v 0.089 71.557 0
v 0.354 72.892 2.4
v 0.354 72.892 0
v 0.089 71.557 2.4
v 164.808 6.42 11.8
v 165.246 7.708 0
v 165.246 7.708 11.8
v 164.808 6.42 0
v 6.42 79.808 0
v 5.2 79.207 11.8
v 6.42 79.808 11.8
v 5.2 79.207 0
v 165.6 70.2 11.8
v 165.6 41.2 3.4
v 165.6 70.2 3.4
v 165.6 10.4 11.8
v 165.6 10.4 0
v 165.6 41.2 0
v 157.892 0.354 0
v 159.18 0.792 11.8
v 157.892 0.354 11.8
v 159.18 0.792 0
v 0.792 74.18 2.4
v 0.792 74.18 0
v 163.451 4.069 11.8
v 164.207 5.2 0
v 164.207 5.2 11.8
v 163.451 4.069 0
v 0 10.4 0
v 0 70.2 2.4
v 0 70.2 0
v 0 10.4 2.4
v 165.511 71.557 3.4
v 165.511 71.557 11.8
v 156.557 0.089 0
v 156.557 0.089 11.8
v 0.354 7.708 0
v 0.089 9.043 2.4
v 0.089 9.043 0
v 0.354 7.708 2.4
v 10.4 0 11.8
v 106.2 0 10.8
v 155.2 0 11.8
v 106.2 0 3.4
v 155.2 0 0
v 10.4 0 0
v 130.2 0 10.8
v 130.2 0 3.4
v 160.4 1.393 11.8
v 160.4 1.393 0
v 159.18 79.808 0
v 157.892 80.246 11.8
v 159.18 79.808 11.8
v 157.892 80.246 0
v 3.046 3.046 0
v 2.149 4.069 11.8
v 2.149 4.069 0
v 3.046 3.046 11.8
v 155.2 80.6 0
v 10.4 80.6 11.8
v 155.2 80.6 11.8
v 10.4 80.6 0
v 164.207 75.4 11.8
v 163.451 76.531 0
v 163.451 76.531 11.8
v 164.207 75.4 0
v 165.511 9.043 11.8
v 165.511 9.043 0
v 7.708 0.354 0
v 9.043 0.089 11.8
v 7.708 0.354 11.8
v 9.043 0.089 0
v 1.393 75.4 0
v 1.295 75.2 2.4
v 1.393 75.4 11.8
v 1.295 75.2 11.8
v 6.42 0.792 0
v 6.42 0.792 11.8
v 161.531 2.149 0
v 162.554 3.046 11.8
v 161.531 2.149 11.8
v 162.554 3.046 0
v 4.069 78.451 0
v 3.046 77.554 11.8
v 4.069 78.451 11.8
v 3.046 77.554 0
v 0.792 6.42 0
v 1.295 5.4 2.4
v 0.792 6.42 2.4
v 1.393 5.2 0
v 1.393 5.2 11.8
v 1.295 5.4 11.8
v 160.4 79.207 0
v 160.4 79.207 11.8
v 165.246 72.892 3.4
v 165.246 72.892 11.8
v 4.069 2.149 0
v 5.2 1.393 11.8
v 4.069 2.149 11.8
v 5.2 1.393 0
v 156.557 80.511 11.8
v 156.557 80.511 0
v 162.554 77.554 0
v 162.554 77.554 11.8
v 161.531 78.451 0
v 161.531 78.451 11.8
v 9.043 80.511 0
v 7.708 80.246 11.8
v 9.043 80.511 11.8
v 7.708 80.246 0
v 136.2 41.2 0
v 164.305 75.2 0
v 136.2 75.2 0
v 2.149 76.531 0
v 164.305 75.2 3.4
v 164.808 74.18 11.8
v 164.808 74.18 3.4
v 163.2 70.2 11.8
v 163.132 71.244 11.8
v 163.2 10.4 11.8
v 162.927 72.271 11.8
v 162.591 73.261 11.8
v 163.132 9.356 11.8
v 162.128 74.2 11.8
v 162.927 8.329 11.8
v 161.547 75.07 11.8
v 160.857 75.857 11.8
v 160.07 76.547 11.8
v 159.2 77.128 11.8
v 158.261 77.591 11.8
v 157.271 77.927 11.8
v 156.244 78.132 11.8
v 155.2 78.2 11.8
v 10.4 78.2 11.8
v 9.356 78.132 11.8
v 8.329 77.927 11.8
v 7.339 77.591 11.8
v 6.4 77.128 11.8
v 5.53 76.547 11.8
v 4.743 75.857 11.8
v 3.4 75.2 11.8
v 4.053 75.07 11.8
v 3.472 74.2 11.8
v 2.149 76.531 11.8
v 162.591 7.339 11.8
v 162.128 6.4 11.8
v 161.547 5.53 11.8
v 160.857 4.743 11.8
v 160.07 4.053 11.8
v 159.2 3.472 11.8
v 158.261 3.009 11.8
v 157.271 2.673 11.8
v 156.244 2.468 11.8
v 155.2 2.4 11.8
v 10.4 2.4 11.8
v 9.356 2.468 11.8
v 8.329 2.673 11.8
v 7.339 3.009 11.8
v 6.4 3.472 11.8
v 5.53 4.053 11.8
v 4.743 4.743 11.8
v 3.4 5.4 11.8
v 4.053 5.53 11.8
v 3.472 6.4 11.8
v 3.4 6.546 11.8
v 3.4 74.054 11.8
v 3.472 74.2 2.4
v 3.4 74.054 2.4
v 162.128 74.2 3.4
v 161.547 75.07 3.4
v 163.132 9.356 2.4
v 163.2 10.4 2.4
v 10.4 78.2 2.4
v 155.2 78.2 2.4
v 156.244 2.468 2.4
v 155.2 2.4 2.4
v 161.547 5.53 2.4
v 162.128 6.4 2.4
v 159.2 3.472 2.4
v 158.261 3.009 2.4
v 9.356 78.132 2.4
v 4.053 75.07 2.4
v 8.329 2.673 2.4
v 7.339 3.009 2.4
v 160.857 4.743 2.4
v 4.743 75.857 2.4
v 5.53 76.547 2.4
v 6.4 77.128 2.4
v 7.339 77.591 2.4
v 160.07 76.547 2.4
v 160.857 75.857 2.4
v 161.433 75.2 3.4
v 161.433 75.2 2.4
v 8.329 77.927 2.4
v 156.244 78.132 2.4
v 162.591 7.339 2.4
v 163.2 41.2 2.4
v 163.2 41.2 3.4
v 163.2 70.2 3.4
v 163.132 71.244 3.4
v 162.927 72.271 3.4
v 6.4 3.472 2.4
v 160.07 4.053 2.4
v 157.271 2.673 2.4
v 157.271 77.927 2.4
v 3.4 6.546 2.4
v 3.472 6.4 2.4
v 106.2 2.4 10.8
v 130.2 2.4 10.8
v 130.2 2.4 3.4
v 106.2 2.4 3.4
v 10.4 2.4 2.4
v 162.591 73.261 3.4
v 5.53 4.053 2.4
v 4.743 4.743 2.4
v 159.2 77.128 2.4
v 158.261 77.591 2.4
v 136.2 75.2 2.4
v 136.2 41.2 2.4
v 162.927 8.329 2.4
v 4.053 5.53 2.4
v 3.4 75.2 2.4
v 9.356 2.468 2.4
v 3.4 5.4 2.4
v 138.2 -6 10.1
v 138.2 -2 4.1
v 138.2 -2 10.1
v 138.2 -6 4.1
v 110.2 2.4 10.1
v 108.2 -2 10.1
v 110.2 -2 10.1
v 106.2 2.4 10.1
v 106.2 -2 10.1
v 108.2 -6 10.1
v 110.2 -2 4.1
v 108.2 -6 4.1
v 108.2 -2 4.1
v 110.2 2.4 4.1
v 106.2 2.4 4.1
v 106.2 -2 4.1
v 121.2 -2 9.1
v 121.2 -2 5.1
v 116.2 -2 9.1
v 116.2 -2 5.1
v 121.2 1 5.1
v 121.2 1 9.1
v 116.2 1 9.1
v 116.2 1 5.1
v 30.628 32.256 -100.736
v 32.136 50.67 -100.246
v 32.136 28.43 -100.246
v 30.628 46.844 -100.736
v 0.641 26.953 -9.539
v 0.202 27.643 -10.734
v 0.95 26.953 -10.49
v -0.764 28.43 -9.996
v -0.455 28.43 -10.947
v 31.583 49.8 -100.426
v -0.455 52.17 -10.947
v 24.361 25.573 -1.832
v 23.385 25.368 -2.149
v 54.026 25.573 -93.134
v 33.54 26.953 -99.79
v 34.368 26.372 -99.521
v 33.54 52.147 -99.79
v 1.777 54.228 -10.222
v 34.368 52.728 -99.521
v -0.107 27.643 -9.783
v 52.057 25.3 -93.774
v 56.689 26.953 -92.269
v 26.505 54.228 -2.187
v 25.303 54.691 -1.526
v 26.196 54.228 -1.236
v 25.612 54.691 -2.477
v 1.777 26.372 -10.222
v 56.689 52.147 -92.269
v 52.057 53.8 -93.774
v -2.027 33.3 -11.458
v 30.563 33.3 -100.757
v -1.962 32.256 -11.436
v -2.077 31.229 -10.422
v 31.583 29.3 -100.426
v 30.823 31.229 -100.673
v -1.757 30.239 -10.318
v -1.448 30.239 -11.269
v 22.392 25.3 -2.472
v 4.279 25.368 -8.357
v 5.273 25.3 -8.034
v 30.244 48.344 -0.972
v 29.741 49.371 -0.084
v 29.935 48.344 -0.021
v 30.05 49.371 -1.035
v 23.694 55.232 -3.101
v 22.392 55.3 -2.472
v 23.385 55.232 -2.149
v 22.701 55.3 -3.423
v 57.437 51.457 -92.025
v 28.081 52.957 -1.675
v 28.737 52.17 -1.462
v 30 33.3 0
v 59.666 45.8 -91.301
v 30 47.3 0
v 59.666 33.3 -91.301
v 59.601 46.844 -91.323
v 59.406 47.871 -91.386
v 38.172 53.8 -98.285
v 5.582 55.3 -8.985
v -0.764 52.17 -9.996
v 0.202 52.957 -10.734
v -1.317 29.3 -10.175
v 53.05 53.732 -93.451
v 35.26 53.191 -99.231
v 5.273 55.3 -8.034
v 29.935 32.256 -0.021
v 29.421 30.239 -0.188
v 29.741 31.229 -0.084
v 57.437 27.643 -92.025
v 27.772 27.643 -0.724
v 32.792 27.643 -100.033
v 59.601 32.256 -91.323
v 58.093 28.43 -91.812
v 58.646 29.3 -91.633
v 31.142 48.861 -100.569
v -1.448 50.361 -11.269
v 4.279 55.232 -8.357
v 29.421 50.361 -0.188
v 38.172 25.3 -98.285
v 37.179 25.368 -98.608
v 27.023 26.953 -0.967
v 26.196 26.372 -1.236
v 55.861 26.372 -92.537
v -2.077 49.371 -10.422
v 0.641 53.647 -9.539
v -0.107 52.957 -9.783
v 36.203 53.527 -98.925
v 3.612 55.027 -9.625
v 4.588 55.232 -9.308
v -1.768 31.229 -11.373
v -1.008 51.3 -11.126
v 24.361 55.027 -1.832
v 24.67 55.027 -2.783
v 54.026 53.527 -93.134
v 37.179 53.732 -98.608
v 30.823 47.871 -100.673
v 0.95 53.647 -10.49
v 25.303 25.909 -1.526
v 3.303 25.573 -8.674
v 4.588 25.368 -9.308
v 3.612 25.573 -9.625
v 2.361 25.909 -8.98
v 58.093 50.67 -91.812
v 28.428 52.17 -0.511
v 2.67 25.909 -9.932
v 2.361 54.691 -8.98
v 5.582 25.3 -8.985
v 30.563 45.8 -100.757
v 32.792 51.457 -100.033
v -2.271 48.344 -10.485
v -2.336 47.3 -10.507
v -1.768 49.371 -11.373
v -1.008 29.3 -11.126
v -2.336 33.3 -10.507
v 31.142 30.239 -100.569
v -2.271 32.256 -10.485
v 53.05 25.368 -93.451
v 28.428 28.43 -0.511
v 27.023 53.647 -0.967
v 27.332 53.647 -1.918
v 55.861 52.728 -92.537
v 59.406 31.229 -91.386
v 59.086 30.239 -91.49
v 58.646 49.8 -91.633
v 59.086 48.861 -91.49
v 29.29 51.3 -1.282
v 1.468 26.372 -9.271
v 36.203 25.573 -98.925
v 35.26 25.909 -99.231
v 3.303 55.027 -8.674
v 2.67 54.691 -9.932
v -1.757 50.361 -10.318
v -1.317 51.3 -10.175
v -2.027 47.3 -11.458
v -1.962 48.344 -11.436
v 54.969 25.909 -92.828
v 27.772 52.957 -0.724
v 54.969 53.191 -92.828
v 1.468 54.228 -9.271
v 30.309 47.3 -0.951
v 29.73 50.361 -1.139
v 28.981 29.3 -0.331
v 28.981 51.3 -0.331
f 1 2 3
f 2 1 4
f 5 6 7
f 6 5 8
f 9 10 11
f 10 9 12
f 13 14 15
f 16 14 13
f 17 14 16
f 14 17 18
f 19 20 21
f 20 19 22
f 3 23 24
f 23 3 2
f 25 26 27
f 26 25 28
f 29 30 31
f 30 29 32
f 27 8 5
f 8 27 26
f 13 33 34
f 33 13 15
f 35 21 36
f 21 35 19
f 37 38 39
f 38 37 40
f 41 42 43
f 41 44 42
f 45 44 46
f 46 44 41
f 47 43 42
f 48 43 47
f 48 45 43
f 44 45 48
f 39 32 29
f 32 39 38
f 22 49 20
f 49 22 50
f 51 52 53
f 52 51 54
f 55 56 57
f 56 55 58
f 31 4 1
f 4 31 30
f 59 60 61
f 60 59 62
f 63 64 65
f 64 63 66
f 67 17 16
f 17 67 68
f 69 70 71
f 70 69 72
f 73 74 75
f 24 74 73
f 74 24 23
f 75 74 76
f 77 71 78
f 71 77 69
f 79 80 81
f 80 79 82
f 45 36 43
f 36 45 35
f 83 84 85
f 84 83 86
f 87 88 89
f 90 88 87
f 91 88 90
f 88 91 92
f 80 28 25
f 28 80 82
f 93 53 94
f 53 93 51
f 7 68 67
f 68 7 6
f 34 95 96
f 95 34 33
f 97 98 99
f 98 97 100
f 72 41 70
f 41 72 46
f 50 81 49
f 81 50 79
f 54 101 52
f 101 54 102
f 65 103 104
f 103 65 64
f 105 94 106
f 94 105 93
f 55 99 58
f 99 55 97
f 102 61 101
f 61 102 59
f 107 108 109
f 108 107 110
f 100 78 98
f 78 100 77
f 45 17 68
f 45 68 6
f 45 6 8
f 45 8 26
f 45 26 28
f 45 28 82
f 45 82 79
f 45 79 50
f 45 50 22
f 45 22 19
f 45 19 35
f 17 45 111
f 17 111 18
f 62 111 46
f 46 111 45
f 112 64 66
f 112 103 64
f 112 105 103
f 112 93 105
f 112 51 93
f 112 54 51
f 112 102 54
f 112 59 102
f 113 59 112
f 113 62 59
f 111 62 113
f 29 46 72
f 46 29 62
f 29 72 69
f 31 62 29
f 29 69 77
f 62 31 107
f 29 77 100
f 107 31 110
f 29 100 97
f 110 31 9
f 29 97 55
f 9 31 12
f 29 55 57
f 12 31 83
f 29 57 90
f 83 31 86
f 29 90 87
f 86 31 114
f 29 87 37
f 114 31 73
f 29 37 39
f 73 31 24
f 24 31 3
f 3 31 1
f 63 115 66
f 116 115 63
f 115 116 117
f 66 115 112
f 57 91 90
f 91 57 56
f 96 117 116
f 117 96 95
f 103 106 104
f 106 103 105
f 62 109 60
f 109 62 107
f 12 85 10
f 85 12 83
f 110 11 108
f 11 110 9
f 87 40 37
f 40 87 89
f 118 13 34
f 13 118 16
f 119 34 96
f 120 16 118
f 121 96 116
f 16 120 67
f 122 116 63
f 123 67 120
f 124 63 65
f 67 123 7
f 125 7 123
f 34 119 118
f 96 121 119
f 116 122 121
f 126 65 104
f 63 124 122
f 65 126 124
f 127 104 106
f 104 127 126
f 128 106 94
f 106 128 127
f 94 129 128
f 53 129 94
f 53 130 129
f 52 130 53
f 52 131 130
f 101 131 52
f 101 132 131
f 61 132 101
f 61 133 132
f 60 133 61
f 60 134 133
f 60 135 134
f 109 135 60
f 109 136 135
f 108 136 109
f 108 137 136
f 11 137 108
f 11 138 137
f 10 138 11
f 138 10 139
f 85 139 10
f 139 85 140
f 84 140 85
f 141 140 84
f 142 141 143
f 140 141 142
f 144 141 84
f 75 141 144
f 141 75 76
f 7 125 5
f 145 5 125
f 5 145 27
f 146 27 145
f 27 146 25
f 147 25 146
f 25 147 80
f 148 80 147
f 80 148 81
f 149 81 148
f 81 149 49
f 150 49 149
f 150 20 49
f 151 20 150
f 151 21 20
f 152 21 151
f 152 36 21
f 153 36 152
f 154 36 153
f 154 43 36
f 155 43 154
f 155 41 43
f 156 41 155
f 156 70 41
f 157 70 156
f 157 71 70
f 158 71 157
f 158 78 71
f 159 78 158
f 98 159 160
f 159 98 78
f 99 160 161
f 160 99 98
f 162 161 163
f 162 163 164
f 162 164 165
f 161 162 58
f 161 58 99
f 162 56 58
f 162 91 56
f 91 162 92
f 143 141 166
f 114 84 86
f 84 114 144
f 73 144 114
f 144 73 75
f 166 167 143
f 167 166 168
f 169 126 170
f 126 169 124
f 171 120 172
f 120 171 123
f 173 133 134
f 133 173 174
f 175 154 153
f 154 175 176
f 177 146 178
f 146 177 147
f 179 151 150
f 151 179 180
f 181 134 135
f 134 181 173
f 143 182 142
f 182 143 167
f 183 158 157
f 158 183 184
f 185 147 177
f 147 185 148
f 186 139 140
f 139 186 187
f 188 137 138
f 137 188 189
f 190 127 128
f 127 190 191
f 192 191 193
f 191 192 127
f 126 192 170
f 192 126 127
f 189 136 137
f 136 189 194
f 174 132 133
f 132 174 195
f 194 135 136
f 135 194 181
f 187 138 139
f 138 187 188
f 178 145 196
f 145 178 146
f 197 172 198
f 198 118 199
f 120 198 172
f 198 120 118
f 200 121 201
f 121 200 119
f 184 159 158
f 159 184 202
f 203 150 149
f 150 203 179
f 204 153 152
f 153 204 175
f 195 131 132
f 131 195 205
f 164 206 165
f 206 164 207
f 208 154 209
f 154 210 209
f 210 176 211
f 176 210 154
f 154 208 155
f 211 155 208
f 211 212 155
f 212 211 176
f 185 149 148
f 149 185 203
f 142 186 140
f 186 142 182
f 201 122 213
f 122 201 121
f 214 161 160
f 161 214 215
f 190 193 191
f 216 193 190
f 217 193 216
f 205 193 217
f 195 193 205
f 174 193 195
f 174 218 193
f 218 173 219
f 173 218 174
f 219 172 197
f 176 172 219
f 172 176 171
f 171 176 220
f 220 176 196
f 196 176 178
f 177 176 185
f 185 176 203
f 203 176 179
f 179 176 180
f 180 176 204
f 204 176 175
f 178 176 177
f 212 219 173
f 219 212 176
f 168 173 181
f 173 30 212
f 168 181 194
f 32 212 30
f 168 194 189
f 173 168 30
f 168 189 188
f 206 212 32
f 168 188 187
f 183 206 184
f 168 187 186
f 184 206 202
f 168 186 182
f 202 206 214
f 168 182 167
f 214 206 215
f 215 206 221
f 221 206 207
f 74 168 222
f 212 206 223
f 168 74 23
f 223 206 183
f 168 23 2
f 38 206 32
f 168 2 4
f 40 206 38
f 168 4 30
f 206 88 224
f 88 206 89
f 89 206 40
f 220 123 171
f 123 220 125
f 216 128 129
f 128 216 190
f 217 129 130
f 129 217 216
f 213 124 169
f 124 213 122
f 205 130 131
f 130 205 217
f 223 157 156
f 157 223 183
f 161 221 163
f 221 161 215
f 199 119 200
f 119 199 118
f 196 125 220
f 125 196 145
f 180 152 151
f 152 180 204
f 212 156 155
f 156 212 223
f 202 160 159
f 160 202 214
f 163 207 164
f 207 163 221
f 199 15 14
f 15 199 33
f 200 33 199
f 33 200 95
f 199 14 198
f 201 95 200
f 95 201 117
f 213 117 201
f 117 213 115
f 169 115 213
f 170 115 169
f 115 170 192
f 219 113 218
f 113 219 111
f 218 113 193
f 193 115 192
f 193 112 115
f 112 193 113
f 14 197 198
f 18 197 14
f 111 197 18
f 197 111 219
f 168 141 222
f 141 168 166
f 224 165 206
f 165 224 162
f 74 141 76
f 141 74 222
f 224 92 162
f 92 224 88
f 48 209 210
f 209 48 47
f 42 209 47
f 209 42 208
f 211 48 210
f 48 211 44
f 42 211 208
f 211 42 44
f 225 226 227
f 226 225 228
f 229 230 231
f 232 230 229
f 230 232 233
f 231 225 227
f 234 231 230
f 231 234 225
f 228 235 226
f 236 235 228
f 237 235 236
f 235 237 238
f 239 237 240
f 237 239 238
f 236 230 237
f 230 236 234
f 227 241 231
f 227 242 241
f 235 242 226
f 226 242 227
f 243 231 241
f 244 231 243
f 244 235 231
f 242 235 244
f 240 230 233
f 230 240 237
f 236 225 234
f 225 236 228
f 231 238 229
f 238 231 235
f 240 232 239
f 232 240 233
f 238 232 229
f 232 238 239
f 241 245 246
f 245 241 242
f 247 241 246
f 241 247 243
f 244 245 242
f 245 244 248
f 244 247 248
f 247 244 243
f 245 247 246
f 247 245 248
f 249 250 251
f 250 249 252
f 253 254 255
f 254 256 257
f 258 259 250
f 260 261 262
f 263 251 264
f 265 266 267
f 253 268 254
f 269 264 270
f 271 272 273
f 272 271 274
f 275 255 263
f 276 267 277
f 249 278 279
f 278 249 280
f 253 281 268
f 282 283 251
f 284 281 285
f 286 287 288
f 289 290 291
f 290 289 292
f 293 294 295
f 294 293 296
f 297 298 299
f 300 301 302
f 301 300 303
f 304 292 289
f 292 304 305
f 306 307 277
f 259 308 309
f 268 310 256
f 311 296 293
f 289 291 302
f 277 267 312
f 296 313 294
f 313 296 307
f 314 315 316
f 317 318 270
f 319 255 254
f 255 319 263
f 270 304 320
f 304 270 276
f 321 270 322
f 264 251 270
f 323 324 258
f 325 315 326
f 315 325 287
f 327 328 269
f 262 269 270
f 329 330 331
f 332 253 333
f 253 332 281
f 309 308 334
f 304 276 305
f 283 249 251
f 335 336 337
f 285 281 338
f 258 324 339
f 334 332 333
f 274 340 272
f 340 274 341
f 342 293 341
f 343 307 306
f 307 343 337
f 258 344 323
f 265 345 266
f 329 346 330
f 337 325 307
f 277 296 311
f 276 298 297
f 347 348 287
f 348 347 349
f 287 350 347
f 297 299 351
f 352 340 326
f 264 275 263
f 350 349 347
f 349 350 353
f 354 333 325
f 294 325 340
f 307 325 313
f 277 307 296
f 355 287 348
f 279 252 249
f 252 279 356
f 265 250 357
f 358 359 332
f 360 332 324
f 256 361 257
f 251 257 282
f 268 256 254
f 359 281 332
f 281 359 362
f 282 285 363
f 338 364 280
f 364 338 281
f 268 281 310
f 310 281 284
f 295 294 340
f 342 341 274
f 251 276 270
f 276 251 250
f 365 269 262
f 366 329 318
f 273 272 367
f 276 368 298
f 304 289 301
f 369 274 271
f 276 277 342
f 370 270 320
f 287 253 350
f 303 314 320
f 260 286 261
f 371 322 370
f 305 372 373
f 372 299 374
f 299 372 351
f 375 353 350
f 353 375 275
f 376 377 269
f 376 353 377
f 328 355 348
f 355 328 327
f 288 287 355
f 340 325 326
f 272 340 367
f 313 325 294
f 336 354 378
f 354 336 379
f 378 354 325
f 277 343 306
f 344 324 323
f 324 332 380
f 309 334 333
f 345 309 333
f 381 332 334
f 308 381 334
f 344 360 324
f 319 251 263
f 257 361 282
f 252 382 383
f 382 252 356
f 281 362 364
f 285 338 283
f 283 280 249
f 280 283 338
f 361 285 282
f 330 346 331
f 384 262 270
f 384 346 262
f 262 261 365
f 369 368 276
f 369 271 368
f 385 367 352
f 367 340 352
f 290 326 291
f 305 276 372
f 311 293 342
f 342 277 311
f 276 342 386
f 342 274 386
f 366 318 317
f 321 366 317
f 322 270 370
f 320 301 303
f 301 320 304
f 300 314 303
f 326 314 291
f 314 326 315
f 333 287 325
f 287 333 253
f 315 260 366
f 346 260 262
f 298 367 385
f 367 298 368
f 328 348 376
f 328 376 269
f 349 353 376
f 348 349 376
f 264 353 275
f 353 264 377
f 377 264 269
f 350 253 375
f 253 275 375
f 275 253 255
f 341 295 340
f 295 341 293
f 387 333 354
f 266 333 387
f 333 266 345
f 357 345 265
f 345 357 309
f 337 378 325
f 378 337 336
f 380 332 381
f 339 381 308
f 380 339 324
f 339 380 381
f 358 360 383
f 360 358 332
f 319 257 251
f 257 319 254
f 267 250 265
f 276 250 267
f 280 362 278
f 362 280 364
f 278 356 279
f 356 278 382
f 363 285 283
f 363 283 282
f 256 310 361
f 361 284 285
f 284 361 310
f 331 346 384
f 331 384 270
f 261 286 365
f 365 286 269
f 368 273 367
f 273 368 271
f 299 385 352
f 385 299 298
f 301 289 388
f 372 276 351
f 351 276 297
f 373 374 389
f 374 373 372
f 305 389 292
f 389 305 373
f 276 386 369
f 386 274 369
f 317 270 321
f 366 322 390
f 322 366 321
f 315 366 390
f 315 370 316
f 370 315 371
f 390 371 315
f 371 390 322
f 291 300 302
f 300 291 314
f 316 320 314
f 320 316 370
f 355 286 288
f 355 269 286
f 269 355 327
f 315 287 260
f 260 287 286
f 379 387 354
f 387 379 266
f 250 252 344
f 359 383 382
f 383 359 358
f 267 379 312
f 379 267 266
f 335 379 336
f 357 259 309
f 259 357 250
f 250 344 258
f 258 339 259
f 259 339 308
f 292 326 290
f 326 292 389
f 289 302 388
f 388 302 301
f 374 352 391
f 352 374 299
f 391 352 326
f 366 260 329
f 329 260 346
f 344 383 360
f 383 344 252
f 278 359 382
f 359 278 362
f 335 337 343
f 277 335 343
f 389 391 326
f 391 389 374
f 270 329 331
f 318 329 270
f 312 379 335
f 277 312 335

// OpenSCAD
// RetroSight — parametric pistol grip (OpenSCAD)
//
// The phone lies in a cradle with its TOP EDGE pointing toward the muzzle. In phone
// (Android sensor) coordinates the barrel direction is therefore +Y for every mount
// style; only the origin offset t_P changes. The script echoes the matching profile
// JSON so you can save it to grip/assets/grip_profiles/<name>.json.
//
// Render:  openscad -o grip.stl -D 'mount="top"' lightgun_grip.scad

/* [Phone] */
phone_len   = 160.0;  // along the long edge (portrait height), mm
phone_wid   = 75.0;   // portrait width, mm
phone_thk   = 9.0;    // with case, mm
corner_r    = 8.0;
// camera module centre, measured on the BACK from the top-left corner (looking at the back)
cam_from_top  = 12.0;
cam_from_left = 20.0;
cam_window_w  = 34.0; // opening size; keep generous so tracking survives
cam_window_h  = 30.0;
// volume-down button centre: distance from the top edge, on which side
vol_from_top  = 45.0;
vol_side      = "right"; // "right" or "left" when looking at the screen

/* [Grip] */
mount       = "top";  // "top": screen up, camera sees the floor. "side": screen faces the player's left
wall        = 2.4;
lip         = 3.0;    // retaining lip over the screen edge
clearance   = 0.4;
handle_len  = 95;
handle_w    = 30;
handle_d    = 34;
handle_angle = 18;    // rake, degrees
handle_from_rear = 30; // handle position from the rear (bottom edge of the phone)
lever       = true;   // printed flexure lever over the volume-down button (trigger)

$fn = 48;

L = phone_len + 2 * clearance;
W = phone_wid + 2 * clearance;
T = phone_thk + clearance;

module rounded_box(l, w, h, r) {
    hull() for (x = [r, l - r], y = [r, w - r]) translate([x, y, 0]) cylinder(r = r, h = h);
}

// Cradle in a local frame: X = toward muzzle (phone top), Y = phone width, Z = up out of the screen.
module cradle() {
    difference() {
        rounded_box(L + 2 * wall, W + 2 * wall, T + wall, corner_r + wall);
        // phone pocket
        translate([wall, wall, wall]) rounded_box(L, W, T + 1, corner_r);
        // screen opening (leave lip)
        translate([wall + lip, wall + lip, wall + 1]) rounded_box(L - 2 * lip, W - 2 * lip, T + 1, corner_r);
        // camera window through the floor (back of phone). Back-view left == screen-view right.
        translate([wall + L - cam_from_top - cam_window_h / 2,
                   wall + W - cam_from_left - cam_window_w / 2, -1])
            cube([cam_window_h, cam_window_w, wall + 2]);
        // slide-in slot at the rear (phone bottom) for inserting the phone
        translate([-1, wall + lip, wall]) cube([wall + 2, W - 2 * lip, T + 1]);
        // volume button access
        translate([wall + L - vol_from_top - 12, vol_side == "right" ? -1 : W + wall - 1, wall + 1])
            cube([24, wall + 2, T - 2]);
    }
    if (lever) trigger_lever();
}

// Flexure lever: hinged at the front, pressed by the index finger, pushes the volume key.
module trigger_lever() {
    side_y = vol_side == "right" ? -6 : W + 2 * wall + 2;
    translate([wall + L - vol_from_top - 10, side_y, wall + T / 2 - 3]) {
        cube([30, 4, 6]);                       // lever arm
        translate([-2, vol_side == "right" ? 4 : -2, 0]) cube([4, 2 + wall, 6]); // hinge web to cradle
        translate([8, vol_side == "right" ? 4 : -3, 1]) cube([5, 3, 4]); // plunger
    }
}

module handle() {
    translate([handle_from_rear, (W + 2 * wall - handle_w) / 2, 0])
        rotate([0, 180 - handle_angle, 0])
            hull() {
                translate([0, 0, 0]) rounded_box(handle_d, handle_w, 1, 8);
                translate([0, 0, handle_len]) rounded_box(handle_d * 0.9, handle_w * 0.95, 1, 8);
            }
}

module grip() {
    if (mount == "top") {
        cradle();
        handle();
    } else {
        // roll the cradle so the screen faces the player's left; camera sees the right-hand room
        translate([0, 0, W + 2 * wall]) rotate([-90, 0, 0]) cradle();
        translate([0, -(T + wall) / 2 + (W + 2 * wall) / 2 - handle_w / 2, 0]) handle();
    }
}

grip();

// ---------------------------------------------------------------------------- profile
// Ray origin offset t_P (metres) from the phone centre to the sight line. The sight line
// sits above the phone for "top" (eye looks along the screen) and on the phone centre
// line for "side". Only the component perpendicular to +Y matters.
t_top  = [0, 0, (T / 2 + 6) / 1000];
t_side = [0, 0, 0];
echo(str("PROFILE {\"name\": \"printed-", mount, "\", \"description\": \"lightgun_grip.scad mount=", mount,
    "\", \"barrel\": {\"b\": [0, 1, 0], \"t\": ", mount == "top" ? t_top : t_side, "}}"));
